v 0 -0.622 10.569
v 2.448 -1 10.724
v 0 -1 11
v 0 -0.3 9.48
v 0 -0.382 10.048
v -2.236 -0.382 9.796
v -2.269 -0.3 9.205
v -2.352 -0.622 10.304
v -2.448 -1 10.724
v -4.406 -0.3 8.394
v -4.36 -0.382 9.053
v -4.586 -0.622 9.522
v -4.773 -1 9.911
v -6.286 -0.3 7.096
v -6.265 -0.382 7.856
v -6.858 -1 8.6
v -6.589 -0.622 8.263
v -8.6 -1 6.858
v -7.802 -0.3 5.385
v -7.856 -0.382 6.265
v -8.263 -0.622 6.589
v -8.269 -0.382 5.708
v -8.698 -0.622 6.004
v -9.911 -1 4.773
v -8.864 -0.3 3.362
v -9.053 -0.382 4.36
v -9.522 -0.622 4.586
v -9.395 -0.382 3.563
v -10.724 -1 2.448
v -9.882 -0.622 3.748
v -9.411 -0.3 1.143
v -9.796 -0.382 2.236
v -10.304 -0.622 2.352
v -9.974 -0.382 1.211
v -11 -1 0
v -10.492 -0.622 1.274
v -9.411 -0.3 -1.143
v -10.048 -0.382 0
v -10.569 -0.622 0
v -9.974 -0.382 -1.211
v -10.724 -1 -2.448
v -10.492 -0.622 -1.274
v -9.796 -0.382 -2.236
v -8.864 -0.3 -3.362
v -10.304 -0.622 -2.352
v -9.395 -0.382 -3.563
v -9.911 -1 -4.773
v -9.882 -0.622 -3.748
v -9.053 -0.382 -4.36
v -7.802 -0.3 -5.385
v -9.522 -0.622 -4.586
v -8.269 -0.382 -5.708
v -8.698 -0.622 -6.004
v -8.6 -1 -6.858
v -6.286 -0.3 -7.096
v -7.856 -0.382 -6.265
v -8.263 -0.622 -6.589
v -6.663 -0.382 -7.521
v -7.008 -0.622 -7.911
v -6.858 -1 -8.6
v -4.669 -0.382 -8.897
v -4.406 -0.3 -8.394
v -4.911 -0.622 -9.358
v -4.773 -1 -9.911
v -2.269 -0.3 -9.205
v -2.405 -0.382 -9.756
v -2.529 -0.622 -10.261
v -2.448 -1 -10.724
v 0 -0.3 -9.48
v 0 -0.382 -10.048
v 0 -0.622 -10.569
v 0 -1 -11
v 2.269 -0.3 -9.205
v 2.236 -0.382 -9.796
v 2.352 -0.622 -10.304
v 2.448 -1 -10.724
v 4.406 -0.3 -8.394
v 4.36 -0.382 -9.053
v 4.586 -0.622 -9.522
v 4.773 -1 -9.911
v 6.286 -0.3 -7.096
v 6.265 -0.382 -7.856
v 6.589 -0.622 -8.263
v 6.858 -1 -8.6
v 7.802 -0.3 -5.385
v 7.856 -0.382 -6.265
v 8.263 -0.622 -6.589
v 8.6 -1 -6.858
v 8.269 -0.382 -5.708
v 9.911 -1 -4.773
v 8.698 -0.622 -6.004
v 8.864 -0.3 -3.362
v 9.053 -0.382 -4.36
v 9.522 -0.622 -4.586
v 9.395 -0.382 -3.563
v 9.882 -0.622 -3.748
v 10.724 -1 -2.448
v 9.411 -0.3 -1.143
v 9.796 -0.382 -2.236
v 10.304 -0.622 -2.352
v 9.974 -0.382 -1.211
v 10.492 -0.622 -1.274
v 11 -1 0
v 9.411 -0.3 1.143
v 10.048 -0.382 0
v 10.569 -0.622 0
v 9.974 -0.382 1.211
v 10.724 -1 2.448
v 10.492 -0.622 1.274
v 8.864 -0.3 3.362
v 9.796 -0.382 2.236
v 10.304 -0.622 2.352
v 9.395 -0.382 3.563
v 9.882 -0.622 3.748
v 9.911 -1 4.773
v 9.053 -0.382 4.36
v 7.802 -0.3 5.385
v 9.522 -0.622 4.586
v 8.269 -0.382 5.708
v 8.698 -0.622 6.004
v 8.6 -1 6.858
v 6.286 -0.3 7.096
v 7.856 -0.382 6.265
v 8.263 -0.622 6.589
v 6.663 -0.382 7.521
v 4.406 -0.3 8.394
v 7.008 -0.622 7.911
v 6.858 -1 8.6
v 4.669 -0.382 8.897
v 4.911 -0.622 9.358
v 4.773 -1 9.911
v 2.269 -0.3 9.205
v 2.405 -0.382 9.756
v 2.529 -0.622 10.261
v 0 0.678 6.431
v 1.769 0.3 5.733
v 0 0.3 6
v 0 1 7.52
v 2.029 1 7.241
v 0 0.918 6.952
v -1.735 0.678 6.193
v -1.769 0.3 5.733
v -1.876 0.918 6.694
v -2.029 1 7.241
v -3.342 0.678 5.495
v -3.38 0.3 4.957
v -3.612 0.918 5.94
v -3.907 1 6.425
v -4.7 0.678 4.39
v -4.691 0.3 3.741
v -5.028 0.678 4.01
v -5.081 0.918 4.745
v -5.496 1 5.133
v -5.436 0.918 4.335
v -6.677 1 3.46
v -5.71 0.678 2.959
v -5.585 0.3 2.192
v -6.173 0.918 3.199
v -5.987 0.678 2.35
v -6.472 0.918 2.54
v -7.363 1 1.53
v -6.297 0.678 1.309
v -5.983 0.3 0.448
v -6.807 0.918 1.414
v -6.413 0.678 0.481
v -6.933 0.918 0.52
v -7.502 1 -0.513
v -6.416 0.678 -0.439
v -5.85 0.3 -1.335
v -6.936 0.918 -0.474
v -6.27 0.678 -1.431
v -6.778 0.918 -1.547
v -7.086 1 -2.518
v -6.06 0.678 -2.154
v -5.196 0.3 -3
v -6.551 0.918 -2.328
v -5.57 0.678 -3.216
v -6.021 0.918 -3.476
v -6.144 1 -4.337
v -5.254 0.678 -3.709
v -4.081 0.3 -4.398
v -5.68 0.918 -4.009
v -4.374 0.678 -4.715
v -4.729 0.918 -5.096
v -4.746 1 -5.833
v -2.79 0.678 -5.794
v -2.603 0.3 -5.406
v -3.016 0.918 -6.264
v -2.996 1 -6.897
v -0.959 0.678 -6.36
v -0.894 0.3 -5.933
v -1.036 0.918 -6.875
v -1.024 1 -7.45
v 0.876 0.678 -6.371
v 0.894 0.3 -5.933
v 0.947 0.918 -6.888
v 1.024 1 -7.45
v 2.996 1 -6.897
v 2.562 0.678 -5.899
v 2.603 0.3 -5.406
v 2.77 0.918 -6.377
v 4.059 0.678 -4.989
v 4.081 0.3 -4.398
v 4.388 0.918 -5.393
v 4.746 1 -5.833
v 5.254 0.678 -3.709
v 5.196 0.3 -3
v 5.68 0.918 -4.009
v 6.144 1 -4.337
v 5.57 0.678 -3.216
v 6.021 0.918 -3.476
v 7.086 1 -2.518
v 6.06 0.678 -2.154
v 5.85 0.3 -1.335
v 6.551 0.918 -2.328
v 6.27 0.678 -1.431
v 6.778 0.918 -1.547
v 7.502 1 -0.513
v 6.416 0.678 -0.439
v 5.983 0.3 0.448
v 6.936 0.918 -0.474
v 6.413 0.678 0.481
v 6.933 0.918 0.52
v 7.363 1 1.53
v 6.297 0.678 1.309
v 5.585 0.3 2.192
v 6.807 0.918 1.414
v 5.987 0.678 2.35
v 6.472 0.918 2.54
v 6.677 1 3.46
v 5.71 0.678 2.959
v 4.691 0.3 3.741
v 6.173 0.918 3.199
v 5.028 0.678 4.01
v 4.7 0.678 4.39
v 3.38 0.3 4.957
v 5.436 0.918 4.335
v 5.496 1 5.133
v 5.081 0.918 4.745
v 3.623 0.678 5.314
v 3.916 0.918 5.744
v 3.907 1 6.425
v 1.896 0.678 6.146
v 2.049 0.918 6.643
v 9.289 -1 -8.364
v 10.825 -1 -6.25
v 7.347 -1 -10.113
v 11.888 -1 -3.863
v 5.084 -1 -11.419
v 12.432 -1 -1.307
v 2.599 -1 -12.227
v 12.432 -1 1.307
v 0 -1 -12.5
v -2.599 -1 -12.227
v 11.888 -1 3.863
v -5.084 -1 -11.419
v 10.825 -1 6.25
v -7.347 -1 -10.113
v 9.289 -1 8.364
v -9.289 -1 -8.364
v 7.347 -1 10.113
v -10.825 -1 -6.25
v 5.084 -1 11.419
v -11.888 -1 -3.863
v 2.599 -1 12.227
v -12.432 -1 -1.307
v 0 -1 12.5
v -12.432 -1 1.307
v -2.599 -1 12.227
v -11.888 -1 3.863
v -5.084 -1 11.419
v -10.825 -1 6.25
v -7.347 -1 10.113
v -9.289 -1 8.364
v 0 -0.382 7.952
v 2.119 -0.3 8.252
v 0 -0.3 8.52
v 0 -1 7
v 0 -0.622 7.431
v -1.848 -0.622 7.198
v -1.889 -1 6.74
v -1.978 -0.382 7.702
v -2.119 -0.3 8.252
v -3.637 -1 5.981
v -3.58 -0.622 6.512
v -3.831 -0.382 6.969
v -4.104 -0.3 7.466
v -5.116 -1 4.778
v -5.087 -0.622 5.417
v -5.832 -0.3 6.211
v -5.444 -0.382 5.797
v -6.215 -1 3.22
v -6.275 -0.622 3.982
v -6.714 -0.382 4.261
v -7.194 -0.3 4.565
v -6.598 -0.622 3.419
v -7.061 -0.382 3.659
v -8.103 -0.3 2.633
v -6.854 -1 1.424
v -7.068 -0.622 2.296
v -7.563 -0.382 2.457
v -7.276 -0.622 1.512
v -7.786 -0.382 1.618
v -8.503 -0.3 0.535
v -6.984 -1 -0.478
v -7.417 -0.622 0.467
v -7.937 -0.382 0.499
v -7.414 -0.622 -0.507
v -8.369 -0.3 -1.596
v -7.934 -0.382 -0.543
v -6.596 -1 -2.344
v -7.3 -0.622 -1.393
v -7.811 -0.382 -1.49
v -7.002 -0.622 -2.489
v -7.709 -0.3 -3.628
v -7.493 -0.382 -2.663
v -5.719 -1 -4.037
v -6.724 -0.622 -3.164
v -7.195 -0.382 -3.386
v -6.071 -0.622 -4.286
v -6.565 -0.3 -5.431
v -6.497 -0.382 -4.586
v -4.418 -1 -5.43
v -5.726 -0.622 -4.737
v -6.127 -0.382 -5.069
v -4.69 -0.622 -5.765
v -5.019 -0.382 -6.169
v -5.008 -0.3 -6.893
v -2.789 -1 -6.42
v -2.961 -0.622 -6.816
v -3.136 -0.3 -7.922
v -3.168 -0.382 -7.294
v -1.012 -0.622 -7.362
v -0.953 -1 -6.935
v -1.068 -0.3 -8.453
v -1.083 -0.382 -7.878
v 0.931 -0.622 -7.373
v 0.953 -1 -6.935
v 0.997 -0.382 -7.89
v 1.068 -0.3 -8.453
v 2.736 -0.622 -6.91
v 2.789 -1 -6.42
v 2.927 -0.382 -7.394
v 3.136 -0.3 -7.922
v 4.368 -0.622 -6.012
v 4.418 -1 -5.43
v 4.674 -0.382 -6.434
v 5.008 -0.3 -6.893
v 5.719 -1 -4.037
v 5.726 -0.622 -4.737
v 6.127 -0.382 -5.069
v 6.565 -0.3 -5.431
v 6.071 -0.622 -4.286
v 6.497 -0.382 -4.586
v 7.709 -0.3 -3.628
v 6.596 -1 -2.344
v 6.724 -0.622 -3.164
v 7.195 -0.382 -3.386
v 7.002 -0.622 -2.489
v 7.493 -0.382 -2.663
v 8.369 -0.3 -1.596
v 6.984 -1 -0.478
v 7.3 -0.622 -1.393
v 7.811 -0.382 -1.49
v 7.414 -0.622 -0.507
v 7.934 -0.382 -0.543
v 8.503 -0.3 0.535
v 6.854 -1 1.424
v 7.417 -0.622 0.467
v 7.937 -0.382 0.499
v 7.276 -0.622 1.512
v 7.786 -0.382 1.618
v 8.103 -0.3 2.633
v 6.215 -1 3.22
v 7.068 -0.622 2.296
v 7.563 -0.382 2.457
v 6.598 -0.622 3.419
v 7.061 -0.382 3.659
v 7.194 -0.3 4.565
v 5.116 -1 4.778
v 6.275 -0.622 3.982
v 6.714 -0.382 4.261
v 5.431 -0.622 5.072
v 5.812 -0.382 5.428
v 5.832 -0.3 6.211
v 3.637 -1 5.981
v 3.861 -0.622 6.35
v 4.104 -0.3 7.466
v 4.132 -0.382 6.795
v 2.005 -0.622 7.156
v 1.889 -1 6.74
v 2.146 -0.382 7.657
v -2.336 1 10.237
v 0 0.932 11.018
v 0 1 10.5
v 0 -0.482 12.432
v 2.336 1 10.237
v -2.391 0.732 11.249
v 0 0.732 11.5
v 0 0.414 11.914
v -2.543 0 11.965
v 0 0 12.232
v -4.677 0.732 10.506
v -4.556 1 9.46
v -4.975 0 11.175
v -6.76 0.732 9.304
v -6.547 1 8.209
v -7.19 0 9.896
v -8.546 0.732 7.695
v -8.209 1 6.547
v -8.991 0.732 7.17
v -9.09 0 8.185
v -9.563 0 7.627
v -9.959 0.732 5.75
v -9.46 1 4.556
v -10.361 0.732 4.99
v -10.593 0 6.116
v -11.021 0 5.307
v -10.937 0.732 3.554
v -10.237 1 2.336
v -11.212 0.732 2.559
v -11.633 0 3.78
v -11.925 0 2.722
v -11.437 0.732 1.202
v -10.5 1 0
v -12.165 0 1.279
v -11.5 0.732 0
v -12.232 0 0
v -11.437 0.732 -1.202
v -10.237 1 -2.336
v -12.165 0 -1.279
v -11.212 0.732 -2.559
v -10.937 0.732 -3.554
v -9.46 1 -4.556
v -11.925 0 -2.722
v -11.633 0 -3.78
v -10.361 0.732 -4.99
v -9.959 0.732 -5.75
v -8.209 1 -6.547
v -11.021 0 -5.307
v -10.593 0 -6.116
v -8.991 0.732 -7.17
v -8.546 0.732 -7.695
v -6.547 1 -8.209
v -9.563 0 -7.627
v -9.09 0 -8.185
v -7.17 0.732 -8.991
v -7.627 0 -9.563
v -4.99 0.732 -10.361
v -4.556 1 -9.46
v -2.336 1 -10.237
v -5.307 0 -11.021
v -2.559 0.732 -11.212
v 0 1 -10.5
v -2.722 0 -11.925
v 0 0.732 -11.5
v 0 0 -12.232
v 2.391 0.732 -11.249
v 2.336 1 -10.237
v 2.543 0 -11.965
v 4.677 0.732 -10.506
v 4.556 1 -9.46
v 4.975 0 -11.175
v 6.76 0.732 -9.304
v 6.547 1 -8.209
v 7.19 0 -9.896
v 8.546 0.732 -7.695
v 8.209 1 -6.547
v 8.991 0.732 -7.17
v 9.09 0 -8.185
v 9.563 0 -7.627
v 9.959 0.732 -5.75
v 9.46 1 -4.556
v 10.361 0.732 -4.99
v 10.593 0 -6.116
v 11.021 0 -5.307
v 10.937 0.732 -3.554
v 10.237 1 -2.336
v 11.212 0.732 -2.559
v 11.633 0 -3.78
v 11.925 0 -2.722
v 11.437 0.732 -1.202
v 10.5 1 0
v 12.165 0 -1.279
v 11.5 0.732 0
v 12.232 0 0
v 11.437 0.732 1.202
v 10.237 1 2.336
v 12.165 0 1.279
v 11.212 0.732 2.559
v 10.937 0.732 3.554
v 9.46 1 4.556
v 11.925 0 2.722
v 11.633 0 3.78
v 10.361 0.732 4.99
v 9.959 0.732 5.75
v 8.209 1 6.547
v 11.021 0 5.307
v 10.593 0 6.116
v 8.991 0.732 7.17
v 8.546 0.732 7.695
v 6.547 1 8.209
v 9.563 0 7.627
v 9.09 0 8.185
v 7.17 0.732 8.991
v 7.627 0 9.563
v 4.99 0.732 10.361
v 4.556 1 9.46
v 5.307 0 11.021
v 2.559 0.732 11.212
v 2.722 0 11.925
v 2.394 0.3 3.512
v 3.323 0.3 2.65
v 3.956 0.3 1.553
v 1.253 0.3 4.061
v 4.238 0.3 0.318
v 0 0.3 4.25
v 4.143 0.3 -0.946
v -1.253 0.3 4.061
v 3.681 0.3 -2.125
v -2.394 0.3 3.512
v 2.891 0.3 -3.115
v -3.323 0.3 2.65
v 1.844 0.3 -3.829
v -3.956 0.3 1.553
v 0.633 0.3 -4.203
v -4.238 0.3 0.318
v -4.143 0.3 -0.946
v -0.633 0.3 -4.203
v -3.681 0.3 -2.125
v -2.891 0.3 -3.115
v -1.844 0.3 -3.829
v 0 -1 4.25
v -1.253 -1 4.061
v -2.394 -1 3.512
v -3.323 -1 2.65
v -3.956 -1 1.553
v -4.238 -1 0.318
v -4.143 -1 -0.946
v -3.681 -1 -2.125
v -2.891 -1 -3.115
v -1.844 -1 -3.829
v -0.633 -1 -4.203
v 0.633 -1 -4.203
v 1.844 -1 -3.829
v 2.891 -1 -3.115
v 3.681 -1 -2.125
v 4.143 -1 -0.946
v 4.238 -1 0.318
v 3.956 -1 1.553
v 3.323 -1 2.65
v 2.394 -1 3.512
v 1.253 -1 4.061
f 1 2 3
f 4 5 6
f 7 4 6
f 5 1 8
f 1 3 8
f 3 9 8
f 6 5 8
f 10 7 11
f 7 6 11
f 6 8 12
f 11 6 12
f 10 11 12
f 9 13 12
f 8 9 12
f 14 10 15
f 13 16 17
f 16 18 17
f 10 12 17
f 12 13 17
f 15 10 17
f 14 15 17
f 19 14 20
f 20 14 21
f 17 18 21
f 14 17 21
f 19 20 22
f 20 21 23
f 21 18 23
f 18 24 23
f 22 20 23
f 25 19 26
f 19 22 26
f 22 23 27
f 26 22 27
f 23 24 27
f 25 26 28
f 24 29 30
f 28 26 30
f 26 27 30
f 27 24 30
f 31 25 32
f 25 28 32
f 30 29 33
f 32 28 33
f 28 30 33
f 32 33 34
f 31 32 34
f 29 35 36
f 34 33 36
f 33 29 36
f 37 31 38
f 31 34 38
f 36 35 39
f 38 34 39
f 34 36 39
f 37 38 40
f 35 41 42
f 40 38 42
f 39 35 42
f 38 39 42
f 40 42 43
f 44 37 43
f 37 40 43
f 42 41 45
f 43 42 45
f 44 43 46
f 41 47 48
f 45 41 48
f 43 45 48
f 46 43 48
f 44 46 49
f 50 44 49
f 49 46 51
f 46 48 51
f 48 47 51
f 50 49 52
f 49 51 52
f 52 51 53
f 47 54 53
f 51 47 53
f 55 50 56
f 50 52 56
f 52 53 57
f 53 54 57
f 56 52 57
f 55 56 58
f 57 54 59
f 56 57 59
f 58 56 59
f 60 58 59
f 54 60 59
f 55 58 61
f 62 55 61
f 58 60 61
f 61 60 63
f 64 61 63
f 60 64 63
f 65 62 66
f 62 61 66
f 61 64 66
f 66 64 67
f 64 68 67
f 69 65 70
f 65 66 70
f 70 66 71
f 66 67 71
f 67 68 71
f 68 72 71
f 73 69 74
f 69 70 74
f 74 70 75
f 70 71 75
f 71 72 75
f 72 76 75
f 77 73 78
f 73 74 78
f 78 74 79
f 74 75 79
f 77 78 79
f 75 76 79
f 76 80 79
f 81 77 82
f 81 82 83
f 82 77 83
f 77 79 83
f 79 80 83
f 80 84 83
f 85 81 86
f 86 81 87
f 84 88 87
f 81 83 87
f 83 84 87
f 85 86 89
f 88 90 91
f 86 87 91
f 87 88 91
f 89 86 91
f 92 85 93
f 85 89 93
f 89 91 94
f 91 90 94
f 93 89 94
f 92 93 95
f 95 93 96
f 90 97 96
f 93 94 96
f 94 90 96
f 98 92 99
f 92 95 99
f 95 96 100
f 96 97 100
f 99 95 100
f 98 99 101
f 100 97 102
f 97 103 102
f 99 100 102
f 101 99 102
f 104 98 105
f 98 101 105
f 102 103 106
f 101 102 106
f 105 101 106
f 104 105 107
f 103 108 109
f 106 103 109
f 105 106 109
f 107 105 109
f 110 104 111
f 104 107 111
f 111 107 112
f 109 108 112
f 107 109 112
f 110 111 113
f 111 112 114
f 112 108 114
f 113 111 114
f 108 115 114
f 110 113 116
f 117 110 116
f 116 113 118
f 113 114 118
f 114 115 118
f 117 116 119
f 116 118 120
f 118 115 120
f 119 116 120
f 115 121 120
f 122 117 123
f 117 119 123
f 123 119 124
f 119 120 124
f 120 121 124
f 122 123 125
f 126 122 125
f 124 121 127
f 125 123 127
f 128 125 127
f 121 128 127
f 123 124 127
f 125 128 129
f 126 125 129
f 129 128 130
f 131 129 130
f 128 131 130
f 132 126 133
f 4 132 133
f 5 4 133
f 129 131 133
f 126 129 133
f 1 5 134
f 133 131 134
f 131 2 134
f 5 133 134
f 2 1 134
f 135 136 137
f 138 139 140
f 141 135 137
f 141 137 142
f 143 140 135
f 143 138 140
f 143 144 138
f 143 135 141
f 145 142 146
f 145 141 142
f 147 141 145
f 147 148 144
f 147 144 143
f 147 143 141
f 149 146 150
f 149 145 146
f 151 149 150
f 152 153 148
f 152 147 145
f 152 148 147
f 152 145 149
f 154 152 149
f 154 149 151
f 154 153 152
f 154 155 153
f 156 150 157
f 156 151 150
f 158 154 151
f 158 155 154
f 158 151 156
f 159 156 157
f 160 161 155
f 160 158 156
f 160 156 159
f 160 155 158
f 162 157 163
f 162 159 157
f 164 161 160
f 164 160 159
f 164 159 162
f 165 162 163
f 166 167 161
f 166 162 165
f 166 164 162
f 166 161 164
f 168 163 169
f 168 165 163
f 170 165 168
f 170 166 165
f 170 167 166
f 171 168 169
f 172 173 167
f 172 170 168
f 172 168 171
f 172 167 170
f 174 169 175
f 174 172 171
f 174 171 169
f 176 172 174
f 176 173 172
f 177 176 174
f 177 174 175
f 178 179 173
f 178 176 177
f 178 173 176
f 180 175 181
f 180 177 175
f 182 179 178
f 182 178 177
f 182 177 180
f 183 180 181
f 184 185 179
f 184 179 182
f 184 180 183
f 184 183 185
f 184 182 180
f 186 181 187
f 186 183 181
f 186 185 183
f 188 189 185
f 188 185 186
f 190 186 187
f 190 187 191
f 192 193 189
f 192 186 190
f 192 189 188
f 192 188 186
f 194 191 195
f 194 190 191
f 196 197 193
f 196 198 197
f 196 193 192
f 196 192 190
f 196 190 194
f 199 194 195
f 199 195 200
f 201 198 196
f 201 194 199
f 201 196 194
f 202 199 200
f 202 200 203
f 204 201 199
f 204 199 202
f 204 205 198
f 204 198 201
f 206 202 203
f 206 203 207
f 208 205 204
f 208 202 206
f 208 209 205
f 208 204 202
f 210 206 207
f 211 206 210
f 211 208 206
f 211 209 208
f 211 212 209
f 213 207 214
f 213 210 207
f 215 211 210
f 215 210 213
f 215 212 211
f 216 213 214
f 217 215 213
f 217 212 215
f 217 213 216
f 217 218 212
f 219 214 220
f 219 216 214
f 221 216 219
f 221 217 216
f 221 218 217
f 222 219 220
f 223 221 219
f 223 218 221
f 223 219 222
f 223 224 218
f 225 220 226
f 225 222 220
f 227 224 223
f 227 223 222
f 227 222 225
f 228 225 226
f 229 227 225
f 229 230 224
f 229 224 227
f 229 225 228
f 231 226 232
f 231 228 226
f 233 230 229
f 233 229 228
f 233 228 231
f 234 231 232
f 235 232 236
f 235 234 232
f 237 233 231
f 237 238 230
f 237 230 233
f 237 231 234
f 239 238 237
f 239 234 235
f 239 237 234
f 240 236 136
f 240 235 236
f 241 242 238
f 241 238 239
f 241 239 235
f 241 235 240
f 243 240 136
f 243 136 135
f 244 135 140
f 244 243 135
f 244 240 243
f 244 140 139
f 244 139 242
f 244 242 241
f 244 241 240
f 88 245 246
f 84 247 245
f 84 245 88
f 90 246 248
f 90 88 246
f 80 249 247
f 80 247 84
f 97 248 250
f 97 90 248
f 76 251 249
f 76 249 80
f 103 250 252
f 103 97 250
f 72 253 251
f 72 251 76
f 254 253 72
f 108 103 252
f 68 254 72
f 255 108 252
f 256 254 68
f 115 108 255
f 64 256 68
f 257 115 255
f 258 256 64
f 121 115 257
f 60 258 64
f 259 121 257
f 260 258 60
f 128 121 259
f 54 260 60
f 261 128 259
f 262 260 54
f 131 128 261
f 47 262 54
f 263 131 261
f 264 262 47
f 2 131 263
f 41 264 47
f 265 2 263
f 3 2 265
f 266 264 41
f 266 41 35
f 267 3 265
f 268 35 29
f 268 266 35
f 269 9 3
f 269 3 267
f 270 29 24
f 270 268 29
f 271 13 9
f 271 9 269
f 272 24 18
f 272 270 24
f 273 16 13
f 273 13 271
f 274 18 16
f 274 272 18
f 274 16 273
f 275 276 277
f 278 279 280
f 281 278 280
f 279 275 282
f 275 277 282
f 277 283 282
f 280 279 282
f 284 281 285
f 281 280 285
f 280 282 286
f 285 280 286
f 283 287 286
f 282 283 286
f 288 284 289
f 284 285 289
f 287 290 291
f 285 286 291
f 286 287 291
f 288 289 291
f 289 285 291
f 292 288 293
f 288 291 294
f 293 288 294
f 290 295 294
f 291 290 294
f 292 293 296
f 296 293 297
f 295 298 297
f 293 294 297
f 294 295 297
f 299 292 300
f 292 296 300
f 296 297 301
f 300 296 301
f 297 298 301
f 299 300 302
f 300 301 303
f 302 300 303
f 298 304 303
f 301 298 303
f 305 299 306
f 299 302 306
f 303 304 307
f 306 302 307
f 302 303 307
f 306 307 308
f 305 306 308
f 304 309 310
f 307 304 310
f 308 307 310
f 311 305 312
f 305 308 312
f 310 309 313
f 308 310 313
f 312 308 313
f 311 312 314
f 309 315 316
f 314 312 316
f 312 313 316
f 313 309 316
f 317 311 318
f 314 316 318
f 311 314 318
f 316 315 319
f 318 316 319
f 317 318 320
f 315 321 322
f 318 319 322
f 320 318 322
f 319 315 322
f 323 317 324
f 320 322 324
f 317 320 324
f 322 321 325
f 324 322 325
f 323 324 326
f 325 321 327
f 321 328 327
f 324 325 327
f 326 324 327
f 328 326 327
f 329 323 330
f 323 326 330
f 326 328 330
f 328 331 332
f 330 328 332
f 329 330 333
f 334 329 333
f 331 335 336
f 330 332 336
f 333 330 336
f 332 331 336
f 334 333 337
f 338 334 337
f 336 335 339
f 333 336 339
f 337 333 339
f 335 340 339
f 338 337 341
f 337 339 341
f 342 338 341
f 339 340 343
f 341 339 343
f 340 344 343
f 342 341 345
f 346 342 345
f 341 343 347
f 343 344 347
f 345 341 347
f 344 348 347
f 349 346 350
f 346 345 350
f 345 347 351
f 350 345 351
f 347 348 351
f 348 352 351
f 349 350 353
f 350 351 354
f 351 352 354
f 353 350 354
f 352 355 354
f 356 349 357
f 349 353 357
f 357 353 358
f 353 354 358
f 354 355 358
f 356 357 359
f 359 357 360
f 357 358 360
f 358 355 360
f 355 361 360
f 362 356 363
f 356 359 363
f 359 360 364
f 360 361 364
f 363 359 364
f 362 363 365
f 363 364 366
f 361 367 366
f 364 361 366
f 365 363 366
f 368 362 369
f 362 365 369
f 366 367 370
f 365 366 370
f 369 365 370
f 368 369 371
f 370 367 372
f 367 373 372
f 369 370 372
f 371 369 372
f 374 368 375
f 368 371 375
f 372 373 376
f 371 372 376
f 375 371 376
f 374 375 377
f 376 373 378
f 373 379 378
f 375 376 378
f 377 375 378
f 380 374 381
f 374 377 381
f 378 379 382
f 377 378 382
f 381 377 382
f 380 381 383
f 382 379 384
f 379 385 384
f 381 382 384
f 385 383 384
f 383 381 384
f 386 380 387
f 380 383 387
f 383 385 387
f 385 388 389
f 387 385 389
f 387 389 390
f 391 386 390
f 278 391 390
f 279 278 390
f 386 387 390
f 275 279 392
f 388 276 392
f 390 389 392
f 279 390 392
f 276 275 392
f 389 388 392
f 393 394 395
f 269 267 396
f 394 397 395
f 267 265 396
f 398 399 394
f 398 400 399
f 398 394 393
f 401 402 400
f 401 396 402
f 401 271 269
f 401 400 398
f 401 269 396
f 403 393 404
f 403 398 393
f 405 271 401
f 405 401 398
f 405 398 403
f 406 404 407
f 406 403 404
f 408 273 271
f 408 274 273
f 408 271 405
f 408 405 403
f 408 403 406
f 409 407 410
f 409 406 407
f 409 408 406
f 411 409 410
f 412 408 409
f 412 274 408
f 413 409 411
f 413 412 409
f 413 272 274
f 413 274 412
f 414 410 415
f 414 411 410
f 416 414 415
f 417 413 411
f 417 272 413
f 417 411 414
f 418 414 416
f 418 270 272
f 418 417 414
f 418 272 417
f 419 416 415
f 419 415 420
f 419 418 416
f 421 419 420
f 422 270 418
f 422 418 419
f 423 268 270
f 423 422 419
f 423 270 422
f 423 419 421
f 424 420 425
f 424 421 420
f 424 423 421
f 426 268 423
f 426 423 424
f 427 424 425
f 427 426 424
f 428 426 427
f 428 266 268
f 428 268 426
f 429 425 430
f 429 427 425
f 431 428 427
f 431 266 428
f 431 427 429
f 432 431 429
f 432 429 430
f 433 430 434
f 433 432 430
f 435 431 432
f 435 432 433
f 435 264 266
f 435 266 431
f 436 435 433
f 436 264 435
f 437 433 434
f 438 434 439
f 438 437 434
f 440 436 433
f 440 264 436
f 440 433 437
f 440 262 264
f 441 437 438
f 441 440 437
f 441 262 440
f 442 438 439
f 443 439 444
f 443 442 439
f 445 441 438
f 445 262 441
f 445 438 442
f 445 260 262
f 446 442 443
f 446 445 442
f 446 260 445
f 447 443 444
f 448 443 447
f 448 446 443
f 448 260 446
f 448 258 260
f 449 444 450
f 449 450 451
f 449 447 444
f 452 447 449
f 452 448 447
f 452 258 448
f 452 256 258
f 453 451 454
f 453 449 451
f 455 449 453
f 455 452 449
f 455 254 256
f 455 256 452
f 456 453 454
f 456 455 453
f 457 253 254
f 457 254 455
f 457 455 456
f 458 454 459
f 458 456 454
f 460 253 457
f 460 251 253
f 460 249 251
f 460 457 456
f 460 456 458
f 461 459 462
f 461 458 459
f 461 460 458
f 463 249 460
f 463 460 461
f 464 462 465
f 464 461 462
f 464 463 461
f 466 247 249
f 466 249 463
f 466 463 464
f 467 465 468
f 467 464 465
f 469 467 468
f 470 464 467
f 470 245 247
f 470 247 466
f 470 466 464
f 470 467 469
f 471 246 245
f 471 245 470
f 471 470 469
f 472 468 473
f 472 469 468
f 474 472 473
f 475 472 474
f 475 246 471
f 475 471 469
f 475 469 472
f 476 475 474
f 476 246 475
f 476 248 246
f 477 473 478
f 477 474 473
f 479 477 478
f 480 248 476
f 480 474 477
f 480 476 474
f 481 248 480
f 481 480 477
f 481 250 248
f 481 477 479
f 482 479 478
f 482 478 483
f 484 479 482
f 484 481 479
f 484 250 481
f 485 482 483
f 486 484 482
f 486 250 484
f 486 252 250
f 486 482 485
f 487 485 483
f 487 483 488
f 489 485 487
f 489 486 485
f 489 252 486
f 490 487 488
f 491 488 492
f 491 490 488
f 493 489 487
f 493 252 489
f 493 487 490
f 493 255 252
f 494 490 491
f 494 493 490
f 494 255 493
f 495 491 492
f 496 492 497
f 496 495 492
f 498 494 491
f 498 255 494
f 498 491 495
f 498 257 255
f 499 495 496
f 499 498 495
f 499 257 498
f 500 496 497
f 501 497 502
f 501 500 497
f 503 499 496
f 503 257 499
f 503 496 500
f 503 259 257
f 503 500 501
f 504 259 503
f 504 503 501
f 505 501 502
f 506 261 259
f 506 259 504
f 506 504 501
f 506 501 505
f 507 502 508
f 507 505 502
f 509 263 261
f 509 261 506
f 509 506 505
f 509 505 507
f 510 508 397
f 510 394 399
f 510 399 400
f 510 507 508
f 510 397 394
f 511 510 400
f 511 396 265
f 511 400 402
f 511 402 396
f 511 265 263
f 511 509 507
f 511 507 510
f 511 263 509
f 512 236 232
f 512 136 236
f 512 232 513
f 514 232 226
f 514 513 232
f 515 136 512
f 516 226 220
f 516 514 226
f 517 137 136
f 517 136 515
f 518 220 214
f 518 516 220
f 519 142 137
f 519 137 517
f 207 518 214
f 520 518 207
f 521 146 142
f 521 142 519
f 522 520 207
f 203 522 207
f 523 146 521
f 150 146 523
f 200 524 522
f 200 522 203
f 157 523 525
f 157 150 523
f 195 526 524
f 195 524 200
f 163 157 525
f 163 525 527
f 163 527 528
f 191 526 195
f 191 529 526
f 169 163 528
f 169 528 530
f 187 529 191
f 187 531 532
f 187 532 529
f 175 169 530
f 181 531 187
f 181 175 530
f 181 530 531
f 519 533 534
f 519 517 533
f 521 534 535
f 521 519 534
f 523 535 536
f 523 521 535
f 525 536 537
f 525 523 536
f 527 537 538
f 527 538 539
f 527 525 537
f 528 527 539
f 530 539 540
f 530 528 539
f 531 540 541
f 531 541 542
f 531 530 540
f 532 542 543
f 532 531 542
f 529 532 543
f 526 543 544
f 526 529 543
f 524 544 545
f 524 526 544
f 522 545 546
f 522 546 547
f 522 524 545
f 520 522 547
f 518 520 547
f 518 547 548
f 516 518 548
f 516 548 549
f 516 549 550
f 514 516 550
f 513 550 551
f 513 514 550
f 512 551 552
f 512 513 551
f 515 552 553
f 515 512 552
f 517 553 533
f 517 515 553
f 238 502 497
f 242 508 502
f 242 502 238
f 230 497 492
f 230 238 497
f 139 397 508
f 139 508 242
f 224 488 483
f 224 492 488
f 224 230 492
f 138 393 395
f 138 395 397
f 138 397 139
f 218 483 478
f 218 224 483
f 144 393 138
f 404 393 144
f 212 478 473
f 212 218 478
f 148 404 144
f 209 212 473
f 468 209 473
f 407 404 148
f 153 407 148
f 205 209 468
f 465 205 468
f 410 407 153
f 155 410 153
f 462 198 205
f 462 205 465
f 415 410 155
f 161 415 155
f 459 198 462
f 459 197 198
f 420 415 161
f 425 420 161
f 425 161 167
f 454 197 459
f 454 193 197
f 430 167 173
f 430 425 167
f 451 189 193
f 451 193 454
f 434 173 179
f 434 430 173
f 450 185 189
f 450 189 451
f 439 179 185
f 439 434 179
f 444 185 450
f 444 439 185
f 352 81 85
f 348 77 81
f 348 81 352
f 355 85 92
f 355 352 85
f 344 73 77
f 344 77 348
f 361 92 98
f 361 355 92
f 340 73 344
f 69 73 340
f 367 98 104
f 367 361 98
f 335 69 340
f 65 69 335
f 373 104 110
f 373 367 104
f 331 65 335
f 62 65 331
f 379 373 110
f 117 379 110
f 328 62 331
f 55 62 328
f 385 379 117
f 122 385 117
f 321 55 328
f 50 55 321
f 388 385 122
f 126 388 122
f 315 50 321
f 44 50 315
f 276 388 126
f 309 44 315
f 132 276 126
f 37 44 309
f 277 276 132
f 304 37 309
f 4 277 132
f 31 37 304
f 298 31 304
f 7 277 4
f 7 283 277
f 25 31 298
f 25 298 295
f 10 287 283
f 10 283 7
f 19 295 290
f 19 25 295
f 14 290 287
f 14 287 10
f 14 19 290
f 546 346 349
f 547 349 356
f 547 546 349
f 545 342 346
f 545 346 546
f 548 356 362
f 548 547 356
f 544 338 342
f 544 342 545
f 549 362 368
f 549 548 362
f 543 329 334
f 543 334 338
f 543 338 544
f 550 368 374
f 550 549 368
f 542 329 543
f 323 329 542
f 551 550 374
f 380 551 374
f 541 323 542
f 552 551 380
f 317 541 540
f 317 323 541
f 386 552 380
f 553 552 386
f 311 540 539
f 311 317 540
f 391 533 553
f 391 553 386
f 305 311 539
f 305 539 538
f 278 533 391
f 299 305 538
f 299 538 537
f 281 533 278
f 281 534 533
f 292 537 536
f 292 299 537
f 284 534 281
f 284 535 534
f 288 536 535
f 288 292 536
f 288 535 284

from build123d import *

# Parameters (mm, degrees)
FILLET1_R = 2


with BuildPart() as part:
    # Sketch1 → Revolve1 (revolve)
    with BuildSketch(Plane.XY, mode=Mode.PRIVATE) as revolve1_sk:
        Polygon((-12.5, 1), (-12.5, -1), (-11, -1), (-11, -0.3), (-7, -0.3), (-7, -1), (-4.25, -1), (-4.25, 0.3), (-6, 0.3), (-6, 1), align=None)
    revolve(revolve1_sk.sketch.rotate(Axis((0, 0.3, 0), (0, -1, 0)), 270), axis=Axis((0, 0.3, 0), (0, -1, 0)))

    # Fillet1
    # the kernel refuses this fillet: 2 mm, written as the material it adds along each edge
    with BuildSketch(Plane(origin=(0, -0.3, 0), x_dir=(0, 0, 1), z_dir=(1, 0, 0))) as fillet1_piece_1:
        with BuildLine():
            CenterArc((8.519868415, 2), FILLET1_R, 220.541601874, 49.458398126)
            Line((7, 0.7), (6.969602632, 0.674))
            ThreePointArc((6.969602632, 0.674), (6.96, 0.35), (6.96, 0))
            Line((6.96, 0), (7, -0.04))
            Line((7, -0.04), (8.519868415, -0.04))
            Line((8.519868415, -0.04), (8.519868415, 0))
        make_face()
    revolve(axis=Axis((0, -0.3, 0), (0, -1, 0)))
    with BuildSketch(Plane(origin=(0, -0.3, 0), x_dir=(0, 0, 1), z_dir=(1, 0, 0))) as fillet1_piece_2:
        with BuildLine():
            CenterArc((9.480131585, 2), FILLET1_R, 270, 49.458398126)
            Line((9.480131585, 0), (9.480131585, -0.04))
            Line((9.480131585, -0.04), (11, -0.04))
            Line((11, -0.04), (11.04, 0))
            ThreePointArc((11.04, 0), (11.04, 0.35), (11.030397368, 0.674))
            Line((11.030397368, 0.674), (11, 0.7))
        make_face()
    revolve(axis=Axis((0, -0.3, 0), (0, -1, 0)))
    # the kernel refuses this fillet: 2 mm, written as the material it takes off along each edge
    with BuildSketch(Plane(origin=(0, 1, 0), x_dir=(0, 0, 1), z_dir=(1, 0, 0))) as fillet1_2_piece_1:
        with BuildLine():
            CenterArc((12.5 - FILLET1_R, FILLET1_R), FILLET1_R, 270, 90)
            Line((12.5 - FILLET1_R, 0), (12.5 - FILLET1_R, -FILLET1_R * 0.02))
            Line((12.5 - FILLET1_R, -FILLET1_R * 0.02), (12.5 + FILLET1_R * 0.02, -FILLET1_R * 0.02))
            Line((12.5 + FILLET1_R * 0.02, -FILLET1_R * 0.02), (12.5 + FILLET1_R * 0.02, FILLET1_R))
            Line((12.5 + FILLET1_R * 0.02, FILLET1_R), (12.5, FILLET1_R))
        make_face()
    revolve(axis=Axis((0, 1, 0), (0, -1, 0)), mode=Mode.SUBTRACT)
    with BuildSketch(Plane(origin=(0, 1, 0), x_dir=(0, 0, 1), z_dir=(1, 0, 0))) as fillet1_2_piece_2:
        with BuildLine():
            CenterArc((7.519868415, 2), FILLET1_R, 220.541601874, 49.458398126)
            Line((6, 0.7), (5.969602632, 0.674))
            ThreePointArc((5.969602632, 0.674), (5.96, 0.35), (5.96, 0))
            Line((5.96, 0), (6, -0.04))
            Line((6, -0.04), (7.519868415, -0.04))
            Line((7.519868415, -0.04), (7.519868415, 0))
        make_face()
    revolve(axis=Axis((0, 1, 0), (0, -1, 0)), mode=Mode.SUBTRACT)


solid = part.part
